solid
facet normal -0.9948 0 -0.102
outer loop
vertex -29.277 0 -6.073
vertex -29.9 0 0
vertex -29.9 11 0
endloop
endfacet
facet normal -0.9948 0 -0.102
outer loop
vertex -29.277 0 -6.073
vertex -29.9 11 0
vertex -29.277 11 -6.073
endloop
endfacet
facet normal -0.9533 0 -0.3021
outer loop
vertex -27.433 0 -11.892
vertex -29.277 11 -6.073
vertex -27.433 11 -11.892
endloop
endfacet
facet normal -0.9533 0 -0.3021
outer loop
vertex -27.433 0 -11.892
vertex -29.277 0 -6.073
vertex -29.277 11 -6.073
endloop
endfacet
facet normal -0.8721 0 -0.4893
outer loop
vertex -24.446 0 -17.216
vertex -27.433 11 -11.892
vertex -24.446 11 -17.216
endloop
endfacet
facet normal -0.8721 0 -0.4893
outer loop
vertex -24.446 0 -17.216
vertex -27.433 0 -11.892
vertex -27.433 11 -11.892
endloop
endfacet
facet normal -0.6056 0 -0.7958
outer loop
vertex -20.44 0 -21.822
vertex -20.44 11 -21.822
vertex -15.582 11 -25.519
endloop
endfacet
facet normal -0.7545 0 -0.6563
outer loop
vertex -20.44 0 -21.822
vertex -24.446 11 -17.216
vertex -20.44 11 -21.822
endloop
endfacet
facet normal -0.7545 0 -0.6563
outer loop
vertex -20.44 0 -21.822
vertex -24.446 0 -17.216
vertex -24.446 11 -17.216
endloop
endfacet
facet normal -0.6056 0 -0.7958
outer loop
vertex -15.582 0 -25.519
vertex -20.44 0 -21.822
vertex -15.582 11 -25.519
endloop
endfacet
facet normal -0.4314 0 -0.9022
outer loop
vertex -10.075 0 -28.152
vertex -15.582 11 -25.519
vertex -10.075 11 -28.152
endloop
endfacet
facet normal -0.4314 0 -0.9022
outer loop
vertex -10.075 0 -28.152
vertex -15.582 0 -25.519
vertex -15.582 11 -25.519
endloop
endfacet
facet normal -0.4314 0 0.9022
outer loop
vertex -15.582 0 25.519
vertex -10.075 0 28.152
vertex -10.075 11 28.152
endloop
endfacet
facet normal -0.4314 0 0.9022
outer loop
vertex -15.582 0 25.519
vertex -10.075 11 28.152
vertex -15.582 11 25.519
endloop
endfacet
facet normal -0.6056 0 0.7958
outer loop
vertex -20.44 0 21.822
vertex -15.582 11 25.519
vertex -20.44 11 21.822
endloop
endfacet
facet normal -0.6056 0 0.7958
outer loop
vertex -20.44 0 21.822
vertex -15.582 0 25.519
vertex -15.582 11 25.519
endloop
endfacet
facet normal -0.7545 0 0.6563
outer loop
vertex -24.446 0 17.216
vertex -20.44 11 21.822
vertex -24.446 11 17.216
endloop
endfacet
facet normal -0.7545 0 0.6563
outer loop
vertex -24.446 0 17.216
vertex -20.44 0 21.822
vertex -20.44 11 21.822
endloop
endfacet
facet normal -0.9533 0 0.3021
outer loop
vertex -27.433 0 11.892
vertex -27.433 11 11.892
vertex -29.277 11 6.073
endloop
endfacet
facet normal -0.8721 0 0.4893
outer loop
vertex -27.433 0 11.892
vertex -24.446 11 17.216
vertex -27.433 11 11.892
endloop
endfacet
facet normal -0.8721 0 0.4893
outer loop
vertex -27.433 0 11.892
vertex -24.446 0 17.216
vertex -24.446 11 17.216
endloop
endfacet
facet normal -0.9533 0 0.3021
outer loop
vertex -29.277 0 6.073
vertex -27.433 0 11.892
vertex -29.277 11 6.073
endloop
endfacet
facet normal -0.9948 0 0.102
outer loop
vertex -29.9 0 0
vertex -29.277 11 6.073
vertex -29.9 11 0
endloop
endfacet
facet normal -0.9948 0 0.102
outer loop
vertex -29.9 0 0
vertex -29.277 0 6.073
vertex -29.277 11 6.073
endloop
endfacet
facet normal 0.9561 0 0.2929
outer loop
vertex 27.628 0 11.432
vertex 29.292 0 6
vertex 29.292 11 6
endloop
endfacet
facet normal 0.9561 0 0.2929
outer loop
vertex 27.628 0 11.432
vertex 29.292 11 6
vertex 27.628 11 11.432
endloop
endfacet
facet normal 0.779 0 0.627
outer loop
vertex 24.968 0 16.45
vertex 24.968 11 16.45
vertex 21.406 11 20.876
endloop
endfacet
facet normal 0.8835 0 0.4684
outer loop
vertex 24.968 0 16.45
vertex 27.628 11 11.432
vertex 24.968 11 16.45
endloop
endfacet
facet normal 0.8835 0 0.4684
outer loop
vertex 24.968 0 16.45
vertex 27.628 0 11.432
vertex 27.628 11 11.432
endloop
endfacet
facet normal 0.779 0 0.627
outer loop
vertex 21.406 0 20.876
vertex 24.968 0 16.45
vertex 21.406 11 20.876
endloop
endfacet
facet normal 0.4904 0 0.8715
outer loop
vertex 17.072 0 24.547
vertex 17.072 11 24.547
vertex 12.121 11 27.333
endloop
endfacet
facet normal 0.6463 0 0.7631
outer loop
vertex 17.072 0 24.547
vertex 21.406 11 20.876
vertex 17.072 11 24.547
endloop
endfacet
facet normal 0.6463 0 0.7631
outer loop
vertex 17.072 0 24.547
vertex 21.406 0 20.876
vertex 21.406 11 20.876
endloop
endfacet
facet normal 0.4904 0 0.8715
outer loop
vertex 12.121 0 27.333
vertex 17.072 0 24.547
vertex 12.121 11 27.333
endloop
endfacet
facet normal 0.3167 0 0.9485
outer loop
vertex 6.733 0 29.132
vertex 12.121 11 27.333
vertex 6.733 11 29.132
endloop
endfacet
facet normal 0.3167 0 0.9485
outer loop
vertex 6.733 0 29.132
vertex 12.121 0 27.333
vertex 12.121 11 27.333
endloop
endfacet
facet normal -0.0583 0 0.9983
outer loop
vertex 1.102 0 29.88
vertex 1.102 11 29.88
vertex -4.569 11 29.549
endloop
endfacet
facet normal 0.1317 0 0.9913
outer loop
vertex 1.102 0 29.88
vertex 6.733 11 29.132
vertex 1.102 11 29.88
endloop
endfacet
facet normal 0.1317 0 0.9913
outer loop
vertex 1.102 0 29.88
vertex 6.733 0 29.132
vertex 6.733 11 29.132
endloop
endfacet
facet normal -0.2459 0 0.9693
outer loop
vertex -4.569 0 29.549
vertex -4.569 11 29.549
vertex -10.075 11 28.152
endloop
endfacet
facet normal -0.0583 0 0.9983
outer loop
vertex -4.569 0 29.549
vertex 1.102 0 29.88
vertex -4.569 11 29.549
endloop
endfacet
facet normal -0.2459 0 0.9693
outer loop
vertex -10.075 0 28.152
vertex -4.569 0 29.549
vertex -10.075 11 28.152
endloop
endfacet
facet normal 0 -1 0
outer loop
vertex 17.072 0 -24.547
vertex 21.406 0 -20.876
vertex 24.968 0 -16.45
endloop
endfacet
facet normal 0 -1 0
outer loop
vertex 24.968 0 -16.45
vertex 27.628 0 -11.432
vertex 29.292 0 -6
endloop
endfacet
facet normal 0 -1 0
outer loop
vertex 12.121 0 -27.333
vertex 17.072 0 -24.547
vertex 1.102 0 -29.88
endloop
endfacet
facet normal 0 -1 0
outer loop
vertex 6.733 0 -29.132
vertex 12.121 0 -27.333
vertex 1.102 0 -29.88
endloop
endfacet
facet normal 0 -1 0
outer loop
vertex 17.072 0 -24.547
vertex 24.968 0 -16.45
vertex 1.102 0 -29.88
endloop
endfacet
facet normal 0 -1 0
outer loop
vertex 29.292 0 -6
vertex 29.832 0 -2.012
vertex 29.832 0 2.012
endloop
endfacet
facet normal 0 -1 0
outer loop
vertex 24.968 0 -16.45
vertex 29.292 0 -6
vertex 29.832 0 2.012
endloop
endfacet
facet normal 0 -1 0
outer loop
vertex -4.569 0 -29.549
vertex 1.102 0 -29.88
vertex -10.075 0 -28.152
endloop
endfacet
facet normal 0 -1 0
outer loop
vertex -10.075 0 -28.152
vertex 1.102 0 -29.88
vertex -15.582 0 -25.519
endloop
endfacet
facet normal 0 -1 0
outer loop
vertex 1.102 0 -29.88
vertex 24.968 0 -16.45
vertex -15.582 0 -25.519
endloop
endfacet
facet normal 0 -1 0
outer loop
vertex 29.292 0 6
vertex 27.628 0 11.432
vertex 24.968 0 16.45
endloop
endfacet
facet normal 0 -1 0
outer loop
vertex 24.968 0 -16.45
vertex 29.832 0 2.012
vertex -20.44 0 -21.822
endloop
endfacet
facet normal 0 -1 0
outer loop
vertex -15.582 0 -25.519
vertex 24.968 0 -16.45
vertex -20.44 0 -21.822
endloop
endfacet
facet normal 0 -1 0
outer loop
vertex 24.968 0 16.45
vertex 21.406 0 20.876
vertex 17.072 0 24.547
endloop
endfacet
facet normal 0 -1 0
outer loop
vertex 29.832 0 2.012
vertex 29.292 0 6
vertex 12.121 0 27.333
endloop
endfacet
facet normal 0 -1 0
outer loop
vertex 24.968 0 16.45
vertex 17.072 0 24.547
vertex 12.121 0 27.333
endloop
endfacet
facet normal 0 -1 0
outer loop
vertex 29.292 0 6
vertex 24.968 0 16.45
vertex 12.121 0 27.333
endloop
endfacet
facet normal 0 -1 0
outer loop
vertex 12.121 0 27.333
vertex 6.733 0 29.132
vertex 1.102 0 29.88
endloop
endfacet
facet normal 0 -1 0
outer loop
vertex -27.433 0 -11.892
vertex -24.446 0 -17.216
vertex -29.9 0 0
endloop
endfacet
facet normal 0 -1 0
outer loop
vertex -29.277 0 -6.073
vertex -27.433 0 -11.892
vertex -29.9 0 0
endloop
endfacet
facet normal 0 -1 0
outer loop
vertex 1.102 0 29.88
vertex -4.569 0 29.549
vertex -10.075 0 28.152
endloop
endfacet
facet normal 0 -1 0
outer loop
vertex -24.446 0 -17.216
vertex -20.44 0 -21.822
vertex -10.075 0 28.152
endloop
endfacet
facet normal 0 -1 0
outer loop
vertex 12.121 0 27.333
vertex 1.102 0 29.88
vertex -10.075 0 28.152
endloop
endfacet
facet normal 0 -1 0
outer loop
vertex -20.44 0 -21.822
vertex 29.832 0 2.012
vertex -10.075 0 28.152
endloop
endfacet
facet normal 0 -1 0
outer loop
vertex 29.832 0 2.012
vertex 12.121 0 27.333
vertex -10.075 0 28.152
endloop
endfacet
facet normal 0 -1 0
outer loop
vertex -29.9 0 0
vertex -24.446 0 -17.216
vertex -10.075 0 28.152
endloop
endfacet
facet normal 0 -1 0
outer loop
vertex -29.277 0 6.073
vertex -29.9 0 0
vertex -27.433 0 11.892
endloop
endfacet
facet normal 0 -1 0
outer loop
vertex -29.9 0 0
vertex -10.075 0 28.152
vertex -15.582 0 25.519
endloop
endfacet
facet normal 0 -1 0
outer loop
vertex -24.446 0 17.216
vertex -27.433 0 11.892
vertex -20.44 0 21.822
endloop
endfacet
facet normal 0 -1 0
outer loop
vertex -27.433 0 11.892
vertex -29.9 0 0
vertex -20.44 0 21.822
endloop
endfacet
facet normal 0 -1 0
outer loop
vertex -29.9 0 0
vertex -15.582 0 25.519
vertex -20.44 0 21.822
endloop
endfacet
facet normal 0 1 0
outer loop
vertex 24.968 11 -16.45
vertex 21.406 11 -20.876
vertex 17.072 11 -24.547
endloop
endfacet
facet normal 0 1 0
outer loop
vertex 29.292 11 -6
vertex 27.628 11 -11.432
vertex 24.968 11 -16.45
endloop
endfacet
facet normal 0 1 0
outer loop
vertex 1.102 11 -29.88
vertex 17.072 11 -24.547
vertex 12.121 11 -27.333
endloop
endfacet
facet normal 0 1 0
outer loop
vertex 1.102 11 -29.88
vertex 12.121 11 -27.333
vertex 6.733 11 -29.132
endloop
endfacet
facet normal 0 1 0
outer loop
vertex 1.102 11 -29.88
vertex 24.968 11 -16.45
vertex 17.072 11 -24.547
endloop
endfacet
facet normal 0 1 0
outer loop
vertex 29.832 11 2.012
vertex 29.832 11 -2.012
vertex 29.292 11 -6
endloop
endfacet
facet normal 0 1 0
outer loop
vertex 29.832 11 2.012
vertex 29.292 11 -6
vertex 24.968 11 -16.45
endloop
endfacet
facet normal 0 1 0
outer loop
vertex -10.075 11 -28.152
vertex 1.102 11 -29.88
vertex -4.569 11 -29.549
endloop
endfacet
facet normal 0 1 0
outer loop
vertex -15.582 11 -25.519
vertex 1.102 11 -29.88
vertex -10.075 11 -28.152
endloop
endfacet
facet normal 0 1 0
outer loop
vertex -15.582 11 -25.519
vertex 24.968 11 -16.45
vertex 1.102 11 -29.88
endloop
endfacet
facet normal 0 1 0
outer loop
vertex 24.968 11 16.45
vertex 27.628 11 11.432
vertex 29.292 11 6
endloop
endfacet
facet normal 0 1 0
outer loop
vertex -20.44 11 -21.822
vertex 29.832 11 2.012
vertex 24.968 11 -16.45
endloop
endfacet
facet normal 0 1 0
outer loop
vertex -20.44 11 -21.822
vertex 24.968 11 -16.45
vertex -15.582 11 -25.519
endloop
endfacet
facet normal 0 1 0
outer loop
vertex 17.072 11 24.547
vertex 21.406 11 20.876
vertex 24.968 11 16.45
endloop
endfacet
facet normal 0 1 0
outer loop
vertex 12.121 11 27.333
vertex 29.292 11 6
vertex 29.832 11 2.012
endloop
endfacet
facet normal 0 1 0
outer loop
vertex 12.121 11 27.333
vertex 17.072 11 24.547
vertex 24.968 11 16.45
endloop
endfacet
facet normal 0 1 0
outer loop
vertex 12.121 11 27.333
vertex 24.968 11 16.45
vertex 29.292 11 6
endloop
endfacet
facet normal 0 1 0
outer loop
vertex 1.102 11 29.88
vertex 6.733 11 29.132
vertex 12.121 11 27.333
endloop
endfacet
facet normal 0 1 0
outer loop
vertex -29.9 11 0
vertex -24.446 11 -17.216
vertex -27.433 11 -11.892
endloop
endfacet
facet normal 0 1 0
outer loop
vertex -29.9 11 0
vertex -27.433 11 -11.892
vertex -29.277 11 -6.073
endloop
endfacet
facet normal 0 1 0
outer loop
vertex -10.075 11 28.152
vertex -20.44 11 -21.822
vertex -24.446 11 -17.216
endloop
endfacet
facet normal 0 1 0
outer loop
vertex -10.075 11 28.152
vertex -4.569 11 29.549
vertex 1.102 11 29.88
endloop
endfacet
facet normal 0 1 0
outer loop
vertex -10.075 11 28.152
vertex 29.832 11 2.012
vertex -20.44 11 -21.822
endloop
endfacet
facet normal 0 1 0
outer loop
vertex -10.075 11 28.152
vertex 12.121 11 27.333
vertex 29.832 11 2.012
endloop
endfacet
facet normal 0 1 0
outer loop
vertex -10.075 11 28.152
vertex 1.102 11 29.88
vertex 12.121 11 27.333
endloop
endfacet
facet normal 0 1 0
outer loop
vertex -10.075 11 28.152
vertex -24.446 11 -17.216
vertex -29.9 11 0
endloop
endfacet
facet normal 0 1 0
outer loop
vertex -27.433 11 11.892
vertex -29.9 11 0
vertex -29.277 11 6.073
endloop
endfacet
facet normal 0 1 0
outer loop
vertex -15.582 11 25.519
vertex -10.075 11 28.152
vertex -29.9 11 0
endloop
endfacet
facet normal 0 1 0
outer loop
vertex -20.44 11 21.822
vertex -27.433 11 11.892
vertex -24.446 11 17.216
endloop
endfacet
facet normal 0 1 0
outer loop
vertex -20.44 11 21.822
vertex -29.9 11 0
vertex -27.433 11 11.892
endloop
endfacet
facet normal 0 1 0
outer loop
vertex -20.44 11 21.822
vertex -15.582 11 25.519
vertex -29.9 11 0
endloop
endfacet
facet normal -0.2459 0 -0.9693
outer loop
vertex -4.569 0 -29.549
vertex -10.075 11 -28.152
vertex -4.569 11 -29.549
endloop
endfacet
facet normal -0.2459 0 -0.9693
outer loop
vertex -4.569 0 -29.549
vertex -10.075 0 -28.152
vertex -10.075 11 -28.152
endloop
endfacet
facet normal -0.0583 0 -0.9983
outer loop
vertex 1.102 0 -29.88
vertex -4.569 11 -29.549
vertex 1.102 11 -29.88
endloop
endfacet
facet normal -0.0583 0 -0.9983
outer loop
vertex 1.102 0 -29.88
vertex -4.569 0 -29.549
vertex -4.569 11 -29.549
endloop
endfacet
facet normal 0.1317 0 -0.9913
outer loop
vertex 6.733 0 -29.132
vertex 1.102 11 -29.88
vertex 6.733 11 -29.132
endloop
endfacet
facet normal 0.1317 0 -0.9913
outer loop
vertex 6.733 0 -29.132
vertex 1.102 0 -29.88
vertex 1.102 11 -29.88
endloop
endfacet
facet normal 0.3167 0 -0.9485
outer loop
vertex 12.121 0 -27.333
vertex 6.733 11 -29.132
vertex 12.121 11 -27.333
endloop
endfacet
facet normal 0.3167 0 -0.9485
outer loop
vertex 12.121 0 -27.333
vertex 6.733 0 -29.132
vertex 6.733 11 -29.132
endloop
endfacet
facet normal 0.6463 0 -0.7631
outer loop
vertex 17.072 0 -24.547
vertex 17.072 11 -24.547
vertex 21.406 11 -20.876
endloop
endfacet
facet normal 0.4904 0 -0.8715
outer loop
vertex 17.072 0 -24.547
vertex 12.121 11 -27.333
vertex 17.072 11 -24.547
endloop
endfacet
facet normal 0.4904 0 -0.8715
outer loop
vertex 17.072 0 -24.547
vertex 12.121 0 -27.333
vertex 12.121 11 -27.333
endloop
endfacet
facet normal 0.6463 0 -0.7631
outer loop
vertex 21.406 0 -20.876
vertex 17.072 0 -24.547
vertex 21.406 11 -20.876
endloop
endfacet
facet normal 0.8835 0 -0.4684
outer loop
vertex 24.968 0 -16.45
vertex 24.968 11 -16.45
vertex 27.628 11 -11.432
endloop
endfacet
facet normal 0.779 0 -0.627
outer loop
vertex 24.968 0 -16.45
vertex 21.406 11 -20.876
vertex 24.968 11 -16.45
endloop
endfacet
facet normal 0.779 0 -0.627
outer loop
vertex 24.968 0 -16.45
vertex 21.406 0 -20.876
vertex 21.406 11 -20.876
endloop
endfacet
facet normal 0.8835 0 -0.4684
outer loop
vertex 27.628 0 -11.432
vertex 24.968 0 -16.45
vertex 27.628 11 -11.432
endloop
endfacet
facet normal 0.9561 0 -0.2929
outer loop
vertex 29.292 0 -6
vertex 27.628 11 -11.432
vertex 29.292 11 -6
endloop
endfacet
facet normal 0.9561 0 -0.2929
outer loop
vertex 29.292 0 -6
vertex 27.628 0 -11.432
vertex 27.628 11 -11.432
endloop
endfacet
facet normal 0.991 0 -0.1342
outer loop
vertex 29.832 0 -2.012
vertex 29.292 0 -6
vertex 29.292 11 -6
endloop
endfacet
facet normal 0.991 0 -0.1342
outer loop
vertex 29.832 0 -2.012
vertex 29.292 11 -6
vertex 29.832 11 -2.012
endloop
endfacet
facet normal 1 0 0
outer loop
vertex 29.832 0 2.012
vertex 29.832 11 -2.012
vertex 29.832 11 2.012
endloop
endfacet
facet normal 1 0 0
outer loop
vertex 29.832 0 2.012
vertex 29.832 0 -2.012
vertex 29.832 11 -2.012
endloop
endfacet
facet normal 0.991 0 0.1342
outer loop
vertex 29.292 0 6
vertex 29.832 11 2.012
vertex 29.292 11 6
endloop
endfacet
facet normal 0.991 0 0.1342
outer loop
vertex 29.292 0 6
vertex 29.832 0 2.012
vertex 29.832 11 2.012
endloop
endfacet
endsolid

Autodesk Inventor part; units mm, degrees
ref_plane "YZ Plane" through (0, 0, 0) normal (1, 0, 0) x (0, 1, 0)
ref_plane "XZ Plane" through (0, 0, 0) normal (0, 1, 0) x (-1, 0, 0)
ref_plane "XY Plane" through (0, 0, 0) normal (0, 0, 1) x (1, 0, 0)
sketch "Szkic1" plane through (0, 0, 0) normal (0, 1, 0) x (-1, 0, 0)
  circle A0 centre (0, 0) radius 29.9
  arc A1 (42.6967, -16.4766) -> (42.6967, 16.4766) centre (36.8, 0) ccw
  arc A2 (-39.1229, 3.647) -> (-39.1229, -3.647) centre (-38.25, 0) ccw
  line L0 (42.6967, 16.4766) -> (10.075, 28.1515)
  line L1 (42.6967, -16.4766) -> (10.075, -28.1515)
  line L2 (-39.1229, 3.647) -> (-29.2918, 6)
  line L3 (-39.1229, -3.647) -> (-29.2918, -6)
  point P0 (54.3, 0)
  point P1 (29.9, 0)
  point P2 (-42, 0)
  dimension "d0" = 59.8
  dimension "d1" = 0
  dimension "d2" = 24.4
  dimension "d3" = 35
  dimension "d4" = 7.5
  dimension "d5" = 96.3
  dimension "d6" = 6
  dimension "d7" = 6
extrude "Wyciągnięcie proste2" add sketch "Szkic1" along normal blind 11 contours A0
properties part number "lidar"
